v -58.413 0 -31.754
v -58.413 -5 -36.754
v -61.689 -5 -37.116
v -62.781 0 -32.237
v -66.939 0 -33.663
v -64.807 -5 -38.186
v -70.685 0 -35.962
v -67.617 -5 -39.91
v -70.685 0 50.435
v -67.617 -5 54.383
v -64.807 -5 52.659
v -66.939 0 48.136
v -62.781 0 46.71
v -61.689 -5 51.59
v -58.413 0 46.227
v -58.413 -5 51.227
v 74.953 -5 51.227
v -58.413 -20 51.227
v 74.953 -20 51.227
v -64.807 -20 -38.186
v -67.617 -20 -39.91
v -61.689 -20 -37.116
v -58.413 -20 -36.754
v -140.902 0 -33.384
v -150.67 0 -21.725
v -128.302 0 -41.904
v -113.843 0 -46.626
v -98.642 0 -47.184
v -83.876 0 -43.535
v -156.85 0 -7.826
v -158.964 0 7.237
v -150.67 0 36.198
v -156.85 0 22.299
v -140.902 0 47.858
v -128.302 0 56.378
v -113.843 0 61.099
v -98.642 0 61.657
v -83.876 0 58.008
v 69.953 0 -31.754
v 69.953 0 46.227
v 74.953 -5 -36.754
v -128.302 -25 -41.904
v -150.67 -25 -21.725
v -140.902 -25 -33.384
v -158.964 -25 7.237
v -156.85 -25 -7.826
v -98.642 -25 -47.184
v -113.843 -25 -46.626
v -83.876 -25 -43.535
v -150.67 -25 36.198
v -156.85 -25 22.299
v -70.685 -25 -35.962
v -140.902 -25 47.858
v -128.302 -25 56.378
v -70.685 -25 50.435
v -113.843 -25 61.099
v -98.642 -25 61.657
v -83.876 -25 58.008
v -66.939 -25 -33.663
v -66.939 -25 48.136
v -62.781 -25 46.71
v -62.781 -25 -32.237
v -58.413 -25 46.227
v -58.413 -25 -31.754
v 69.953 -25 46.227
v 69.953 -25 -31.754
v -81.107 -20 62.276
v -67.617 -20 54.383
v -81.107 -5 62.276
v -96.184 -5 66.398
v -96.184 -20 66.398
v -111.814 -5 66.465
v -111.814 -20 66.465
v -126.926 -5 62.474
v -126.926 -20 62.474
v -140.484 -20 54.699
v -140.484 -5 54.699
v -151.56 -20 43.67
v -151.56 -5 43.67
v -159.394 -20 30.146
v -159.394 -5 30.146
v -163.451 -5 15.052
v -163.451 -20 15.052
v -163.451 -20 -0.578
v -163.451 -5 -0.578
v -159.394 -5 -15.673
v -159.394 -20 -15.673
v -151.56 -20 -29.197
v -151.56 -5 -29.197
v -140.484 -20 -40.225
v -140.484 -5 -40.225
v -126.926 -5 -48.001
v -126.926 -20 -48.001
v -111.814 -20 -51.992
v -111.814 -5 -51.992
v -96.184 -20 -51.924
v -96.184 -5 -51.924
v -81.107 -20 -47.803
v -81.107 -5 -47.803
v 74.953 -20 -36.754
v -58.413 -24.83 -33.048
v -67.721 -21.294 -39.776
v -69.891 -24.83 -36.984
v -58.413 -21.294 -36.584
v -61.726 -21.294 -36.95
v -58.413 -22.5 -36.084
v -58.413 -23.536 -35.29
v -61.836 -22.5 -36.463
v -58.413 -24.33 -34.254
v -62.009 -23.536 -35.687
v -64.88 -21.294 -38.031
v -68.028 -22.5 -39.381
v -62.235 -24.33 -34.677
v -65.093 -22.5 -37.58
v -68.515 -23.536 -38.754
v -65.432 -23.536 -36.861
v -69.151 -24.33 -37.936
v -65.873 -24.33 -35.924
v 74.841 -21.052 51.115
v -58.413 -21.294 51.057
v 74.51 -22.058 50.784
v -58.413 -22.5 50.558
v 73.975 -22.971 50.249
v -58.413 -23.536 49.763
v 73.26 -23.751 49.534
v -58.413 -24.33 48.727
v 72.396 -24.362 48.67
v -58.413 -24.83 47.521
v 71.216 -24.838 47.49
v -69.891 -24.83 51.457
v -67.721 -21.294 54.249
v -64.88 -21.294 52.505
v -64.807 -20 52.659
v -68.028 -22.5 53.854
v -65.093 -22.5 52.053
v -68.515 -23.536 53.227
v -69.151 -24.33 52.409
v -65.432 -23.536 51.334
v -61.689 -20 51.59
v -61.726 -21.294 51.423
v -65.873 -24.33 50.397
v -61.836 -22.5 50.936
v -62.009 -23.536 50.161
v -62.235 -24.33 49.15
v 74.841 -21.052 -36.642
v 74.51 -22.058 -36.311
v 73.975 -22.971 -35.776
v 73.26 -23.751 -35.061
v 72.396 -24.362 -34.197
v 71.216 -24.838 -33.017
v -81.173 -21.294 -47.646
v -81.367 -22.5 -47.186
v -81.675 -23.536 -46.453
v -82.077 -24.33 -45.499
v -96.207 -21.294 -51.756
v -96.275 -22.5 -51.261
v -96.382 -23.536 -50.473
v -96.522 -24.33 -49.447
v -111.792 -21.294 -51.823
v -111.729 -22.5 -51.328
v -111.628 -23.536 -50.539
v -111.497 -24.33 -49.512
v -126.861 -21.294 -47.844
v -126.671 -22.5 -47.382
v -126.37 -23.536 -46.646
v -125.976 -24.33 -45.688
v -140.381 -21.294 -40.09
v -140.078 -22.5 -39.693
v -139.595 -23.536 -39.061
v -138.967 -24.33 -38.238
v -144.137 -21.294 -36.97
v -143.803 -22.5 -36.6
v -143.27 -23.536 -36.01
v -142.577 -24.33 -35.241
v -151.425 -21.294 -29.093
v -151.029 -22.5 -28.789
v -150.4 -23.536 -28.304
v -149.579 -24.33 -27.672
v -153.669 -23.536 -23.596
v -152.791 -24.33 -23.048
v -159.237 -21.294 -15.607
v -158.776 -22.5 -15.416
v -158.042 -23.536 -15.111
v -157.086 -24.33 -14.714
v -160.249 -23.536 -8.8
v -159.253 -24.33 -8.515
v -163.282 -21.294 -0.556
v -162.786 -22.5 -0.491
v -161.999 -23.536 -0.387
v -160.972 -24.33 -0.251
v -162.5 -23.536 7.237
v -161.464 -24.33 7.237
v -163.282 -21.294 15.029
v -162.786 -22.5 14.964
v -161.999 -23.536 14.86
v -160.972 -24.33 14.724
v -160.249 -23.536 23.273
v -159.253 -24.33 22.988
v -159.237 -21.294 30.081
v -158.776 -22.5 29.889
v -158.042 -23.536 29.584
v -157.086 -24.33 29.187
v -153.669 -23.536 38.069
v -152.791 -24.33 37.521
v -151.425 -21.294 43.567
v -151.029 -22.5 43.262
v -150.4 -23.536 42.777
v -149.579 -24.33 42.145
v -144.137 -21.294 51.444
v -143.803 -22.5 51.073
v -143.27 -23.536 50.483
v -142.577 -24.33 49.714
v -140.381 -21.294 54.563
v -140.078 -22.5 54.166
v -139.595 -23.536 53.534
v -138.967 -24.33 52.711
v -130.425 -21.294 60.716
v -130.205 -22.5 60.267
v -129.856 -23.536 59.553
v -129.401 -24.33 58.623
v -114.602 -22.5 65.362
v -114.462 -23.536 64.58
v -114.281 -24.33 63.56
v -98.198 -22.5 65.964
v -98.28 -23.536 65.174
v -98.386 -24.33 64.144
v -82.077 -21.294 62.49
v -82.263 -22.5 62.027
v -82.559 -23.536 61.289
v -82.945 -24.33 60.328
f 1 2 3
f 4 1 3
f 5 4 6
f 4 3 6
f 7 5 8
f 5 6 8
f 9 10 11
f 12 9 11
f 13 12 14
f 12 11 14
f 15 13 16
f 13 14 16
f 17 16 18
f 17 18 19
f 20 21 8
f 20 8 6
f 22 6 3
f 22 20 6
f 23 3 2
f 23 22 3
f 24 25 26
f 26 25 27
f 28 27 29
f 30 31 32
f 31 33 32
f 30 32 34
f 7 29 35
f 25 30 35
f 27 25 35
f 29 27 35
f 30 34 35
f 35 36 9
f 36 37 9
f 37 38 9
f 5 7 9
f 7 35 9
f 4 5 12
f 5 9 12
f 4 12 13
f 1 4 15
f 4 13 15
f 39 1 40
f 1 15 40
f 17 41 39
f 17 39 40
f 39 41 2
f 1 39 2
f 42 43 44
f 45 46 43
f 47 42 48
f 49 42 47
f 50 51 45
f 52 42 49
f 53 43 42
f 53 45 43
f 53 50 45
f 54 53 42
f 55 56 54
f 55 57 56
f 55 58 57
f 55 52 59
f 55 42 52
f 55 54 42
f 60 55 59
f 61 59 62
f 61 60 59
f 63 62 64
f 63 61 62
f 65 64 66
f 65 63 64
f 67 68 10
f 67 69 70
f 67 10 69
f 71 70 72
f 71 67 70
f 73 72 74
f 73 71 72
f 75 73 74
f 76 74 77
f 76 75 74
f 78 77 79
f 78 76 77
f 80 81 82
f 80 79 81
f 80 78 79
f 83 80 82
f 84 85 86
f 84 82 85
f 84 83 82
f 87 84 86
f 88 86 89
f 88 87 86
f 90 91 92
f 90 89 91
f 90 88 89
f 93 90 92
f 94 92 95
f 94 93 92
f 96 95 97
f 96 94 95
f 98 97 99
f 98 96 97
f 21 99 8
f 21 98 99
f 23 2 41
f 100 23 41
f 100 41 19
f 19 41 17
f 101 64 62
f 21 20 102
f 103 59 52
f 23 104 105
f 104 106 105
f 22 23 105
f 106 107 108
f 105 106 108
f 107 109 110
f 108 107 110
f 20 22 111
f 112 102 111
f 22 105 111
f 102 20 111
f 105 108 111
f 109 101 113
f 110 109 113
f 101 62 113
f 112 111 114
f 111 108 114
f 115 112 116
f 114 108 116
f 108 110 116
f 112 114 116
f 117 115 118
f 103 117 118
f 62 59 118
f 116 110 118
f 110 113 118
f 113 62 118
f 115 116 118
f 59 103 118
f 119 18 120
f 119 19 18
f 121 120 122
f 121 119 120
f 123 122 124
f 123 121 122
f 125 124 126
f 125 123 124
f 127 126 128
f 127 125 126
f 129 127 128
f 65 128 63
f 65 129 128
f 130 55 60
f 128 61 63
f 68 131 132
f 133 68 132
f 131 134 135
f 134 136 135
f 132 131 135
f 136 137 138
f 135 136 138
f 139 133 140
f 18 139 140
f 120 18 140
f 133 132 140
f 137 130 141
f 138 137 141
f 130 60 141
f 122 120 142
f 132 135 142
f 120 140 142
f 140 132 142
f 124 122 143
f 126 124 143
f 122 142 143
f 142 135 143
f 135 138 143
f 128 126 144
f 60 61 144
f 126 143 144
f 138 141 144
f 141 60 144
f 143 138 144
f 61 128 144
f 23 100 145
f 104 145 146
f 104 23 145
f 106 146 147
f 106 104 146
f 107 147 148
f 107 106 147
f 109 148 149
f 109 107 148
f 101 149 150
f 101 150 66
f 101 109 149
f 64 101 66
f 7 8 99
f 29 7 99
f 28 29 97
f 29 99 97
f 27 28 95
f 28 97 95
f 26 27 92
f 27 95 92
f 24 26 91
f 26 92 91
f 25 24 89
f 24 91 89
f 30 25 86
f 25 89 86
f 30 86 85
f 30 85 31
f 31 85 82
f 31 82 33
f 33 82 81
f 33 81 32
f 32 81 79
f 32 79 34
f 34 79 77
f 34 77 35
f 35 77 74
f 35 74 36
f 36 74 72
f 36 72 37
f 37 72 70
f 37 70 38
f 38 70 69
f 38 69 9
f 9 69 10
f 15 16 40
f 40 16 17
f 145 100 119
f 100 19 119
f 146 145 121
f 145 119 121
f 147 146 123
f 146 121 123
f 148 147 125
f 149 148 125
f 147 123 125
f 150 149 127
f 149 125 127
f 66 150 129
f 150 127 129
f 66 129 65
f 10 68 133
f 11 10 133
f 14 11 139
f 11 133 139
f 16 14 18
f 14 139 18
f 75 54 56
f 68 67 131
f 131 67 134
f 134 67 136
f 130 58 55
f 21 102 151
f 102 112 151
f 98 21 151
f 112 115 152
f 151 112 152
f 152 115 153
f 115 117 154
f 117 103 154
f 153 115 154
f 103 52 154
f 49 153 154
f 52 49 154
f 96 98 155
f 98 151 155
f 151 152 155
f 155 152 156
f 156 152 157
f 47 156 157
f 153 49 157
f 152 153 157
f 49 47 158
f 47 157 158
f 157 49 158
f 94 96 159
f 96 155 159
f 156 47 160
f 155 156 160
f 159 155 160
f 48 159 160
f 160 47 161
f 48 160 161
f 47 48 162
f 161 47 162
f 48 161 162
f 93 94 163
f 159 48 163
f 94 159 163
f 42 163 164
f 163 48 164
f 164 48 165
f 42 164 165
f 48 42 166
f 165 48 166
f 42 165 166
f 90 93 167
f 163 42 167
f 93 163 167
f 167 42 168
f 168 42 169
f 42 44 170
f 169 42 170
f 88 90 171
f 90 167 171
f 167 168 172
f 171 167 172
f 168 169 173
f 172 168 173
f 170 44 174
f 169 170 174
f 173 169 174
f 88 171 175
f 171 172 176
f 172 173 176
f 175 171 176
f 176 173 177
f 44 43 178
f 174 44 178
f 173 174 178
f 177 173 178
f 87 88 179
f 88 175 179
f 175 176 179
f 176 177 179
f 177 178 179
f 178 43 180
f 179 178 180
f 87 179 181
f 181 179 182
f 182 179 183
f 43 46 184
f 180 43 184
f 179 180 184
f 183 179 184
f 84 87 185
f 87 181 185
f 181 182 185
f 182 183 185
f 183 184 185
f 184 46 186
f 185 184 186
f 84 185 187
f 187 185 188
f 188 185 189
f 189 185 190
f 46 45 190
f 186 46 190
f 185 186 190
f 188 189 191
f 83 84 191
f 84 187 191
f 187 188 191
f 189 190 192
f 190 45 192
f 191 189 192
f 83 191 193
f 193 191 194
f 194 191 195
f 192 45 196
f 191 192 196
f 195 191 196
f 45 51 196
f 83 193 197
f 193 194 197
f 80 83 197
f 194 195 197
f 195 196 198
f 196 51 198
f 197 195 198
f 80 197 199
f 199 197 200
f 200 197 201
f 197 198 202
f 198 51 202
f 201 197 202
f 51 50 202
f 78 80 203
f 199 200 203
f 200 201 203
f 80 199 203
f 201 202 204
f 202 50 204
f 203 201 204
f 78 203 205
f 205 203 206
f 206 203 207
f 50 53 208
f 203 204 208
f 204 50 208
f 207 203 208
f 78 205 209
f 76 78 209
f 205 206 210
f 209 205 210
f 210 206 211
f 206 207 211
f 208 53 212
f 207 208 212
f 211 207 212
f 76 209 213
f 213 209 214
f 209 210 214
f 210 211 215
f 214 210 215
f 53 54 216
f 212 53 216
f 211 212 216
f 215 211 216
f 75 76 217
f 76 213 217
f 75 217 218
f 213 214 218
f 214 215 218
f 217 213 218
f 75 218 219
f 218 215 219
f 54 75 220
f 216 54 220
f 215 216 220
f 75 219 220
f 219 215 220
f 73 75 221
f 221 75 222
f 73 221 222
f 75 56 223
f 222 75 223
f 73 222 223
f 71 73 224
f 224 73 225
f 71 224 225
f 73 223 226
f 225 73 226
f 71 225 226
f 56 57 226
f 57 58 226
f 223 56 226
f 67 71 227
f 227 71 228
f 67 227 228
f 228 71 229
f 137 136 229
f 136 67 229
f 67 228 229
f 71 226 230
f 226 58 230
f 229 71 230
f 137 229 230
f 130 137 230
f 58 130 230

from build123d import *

# Parameters (mm, degrees)
F0_W     = 179.208383
F0_H     = 87.981586
F1_DEPTH = 25
F2_R     = 59.70905
F3_DEPTH = 25
F4_R     = 15
F5_R     = 5
F6_SIZE  = 5


with BuildPart() as f1:
    # F0 (on Front) → F1 (new body)
    with BuildSketch(Plane.XZ):
        with Locations((-14.650919, 7.236587)):
            Rectangle(F0_W, F0_H)
    extrude(amount=F1_DEPTH)

    # F2 (on face) → F3 (join, through all)
    with BuildSketch(Plane.XZ.offset(25)):
        with Locations((-104.25511, 7.236587)):
            Circle(F2_R)
    extrude(amount=-F3_DEPTH)

    # F4
    f4_edges = [f1.edges().sort_by_distance(p)[0] for p in [
        (-63.882089, -12.5, 51.22738),
        (-63.882089, -12.5, -36.754206),
    ]]
    fillet(f4_edges, radius=F4_R)

    # F5
    f5_edges = [f1.edges().sort_by_distance(p)[0] for p in [
        (8.270297, -25, 51.22738),
        (-63.277779, -25, 52.038271),
        (74.953273, -25, 7.236587),
        (-163.96416, -25, 7.236587),
        (8.270297, -25, -36.754206),
        (-63.277779, -25, -37.565098),
    ]]
    fillet(f5_edges, radius=F5_R)

    # F6
    f6_edges = [f1.edges().sort_by_distance(p)[0] for p in [
        (8.270297, 0, 51.22738),
        (-63.277779, 0, 52.038271),
        (74.953273, 0, 7.236587),
        (-163.96416, 0, 7.236587),
        (8.270297, 0, -36.754206),
        (-63.277779, 0, -37.565098),
    ]]
    chamfer(f6_edges, length=F6_SIZE)


solid = f1.part
